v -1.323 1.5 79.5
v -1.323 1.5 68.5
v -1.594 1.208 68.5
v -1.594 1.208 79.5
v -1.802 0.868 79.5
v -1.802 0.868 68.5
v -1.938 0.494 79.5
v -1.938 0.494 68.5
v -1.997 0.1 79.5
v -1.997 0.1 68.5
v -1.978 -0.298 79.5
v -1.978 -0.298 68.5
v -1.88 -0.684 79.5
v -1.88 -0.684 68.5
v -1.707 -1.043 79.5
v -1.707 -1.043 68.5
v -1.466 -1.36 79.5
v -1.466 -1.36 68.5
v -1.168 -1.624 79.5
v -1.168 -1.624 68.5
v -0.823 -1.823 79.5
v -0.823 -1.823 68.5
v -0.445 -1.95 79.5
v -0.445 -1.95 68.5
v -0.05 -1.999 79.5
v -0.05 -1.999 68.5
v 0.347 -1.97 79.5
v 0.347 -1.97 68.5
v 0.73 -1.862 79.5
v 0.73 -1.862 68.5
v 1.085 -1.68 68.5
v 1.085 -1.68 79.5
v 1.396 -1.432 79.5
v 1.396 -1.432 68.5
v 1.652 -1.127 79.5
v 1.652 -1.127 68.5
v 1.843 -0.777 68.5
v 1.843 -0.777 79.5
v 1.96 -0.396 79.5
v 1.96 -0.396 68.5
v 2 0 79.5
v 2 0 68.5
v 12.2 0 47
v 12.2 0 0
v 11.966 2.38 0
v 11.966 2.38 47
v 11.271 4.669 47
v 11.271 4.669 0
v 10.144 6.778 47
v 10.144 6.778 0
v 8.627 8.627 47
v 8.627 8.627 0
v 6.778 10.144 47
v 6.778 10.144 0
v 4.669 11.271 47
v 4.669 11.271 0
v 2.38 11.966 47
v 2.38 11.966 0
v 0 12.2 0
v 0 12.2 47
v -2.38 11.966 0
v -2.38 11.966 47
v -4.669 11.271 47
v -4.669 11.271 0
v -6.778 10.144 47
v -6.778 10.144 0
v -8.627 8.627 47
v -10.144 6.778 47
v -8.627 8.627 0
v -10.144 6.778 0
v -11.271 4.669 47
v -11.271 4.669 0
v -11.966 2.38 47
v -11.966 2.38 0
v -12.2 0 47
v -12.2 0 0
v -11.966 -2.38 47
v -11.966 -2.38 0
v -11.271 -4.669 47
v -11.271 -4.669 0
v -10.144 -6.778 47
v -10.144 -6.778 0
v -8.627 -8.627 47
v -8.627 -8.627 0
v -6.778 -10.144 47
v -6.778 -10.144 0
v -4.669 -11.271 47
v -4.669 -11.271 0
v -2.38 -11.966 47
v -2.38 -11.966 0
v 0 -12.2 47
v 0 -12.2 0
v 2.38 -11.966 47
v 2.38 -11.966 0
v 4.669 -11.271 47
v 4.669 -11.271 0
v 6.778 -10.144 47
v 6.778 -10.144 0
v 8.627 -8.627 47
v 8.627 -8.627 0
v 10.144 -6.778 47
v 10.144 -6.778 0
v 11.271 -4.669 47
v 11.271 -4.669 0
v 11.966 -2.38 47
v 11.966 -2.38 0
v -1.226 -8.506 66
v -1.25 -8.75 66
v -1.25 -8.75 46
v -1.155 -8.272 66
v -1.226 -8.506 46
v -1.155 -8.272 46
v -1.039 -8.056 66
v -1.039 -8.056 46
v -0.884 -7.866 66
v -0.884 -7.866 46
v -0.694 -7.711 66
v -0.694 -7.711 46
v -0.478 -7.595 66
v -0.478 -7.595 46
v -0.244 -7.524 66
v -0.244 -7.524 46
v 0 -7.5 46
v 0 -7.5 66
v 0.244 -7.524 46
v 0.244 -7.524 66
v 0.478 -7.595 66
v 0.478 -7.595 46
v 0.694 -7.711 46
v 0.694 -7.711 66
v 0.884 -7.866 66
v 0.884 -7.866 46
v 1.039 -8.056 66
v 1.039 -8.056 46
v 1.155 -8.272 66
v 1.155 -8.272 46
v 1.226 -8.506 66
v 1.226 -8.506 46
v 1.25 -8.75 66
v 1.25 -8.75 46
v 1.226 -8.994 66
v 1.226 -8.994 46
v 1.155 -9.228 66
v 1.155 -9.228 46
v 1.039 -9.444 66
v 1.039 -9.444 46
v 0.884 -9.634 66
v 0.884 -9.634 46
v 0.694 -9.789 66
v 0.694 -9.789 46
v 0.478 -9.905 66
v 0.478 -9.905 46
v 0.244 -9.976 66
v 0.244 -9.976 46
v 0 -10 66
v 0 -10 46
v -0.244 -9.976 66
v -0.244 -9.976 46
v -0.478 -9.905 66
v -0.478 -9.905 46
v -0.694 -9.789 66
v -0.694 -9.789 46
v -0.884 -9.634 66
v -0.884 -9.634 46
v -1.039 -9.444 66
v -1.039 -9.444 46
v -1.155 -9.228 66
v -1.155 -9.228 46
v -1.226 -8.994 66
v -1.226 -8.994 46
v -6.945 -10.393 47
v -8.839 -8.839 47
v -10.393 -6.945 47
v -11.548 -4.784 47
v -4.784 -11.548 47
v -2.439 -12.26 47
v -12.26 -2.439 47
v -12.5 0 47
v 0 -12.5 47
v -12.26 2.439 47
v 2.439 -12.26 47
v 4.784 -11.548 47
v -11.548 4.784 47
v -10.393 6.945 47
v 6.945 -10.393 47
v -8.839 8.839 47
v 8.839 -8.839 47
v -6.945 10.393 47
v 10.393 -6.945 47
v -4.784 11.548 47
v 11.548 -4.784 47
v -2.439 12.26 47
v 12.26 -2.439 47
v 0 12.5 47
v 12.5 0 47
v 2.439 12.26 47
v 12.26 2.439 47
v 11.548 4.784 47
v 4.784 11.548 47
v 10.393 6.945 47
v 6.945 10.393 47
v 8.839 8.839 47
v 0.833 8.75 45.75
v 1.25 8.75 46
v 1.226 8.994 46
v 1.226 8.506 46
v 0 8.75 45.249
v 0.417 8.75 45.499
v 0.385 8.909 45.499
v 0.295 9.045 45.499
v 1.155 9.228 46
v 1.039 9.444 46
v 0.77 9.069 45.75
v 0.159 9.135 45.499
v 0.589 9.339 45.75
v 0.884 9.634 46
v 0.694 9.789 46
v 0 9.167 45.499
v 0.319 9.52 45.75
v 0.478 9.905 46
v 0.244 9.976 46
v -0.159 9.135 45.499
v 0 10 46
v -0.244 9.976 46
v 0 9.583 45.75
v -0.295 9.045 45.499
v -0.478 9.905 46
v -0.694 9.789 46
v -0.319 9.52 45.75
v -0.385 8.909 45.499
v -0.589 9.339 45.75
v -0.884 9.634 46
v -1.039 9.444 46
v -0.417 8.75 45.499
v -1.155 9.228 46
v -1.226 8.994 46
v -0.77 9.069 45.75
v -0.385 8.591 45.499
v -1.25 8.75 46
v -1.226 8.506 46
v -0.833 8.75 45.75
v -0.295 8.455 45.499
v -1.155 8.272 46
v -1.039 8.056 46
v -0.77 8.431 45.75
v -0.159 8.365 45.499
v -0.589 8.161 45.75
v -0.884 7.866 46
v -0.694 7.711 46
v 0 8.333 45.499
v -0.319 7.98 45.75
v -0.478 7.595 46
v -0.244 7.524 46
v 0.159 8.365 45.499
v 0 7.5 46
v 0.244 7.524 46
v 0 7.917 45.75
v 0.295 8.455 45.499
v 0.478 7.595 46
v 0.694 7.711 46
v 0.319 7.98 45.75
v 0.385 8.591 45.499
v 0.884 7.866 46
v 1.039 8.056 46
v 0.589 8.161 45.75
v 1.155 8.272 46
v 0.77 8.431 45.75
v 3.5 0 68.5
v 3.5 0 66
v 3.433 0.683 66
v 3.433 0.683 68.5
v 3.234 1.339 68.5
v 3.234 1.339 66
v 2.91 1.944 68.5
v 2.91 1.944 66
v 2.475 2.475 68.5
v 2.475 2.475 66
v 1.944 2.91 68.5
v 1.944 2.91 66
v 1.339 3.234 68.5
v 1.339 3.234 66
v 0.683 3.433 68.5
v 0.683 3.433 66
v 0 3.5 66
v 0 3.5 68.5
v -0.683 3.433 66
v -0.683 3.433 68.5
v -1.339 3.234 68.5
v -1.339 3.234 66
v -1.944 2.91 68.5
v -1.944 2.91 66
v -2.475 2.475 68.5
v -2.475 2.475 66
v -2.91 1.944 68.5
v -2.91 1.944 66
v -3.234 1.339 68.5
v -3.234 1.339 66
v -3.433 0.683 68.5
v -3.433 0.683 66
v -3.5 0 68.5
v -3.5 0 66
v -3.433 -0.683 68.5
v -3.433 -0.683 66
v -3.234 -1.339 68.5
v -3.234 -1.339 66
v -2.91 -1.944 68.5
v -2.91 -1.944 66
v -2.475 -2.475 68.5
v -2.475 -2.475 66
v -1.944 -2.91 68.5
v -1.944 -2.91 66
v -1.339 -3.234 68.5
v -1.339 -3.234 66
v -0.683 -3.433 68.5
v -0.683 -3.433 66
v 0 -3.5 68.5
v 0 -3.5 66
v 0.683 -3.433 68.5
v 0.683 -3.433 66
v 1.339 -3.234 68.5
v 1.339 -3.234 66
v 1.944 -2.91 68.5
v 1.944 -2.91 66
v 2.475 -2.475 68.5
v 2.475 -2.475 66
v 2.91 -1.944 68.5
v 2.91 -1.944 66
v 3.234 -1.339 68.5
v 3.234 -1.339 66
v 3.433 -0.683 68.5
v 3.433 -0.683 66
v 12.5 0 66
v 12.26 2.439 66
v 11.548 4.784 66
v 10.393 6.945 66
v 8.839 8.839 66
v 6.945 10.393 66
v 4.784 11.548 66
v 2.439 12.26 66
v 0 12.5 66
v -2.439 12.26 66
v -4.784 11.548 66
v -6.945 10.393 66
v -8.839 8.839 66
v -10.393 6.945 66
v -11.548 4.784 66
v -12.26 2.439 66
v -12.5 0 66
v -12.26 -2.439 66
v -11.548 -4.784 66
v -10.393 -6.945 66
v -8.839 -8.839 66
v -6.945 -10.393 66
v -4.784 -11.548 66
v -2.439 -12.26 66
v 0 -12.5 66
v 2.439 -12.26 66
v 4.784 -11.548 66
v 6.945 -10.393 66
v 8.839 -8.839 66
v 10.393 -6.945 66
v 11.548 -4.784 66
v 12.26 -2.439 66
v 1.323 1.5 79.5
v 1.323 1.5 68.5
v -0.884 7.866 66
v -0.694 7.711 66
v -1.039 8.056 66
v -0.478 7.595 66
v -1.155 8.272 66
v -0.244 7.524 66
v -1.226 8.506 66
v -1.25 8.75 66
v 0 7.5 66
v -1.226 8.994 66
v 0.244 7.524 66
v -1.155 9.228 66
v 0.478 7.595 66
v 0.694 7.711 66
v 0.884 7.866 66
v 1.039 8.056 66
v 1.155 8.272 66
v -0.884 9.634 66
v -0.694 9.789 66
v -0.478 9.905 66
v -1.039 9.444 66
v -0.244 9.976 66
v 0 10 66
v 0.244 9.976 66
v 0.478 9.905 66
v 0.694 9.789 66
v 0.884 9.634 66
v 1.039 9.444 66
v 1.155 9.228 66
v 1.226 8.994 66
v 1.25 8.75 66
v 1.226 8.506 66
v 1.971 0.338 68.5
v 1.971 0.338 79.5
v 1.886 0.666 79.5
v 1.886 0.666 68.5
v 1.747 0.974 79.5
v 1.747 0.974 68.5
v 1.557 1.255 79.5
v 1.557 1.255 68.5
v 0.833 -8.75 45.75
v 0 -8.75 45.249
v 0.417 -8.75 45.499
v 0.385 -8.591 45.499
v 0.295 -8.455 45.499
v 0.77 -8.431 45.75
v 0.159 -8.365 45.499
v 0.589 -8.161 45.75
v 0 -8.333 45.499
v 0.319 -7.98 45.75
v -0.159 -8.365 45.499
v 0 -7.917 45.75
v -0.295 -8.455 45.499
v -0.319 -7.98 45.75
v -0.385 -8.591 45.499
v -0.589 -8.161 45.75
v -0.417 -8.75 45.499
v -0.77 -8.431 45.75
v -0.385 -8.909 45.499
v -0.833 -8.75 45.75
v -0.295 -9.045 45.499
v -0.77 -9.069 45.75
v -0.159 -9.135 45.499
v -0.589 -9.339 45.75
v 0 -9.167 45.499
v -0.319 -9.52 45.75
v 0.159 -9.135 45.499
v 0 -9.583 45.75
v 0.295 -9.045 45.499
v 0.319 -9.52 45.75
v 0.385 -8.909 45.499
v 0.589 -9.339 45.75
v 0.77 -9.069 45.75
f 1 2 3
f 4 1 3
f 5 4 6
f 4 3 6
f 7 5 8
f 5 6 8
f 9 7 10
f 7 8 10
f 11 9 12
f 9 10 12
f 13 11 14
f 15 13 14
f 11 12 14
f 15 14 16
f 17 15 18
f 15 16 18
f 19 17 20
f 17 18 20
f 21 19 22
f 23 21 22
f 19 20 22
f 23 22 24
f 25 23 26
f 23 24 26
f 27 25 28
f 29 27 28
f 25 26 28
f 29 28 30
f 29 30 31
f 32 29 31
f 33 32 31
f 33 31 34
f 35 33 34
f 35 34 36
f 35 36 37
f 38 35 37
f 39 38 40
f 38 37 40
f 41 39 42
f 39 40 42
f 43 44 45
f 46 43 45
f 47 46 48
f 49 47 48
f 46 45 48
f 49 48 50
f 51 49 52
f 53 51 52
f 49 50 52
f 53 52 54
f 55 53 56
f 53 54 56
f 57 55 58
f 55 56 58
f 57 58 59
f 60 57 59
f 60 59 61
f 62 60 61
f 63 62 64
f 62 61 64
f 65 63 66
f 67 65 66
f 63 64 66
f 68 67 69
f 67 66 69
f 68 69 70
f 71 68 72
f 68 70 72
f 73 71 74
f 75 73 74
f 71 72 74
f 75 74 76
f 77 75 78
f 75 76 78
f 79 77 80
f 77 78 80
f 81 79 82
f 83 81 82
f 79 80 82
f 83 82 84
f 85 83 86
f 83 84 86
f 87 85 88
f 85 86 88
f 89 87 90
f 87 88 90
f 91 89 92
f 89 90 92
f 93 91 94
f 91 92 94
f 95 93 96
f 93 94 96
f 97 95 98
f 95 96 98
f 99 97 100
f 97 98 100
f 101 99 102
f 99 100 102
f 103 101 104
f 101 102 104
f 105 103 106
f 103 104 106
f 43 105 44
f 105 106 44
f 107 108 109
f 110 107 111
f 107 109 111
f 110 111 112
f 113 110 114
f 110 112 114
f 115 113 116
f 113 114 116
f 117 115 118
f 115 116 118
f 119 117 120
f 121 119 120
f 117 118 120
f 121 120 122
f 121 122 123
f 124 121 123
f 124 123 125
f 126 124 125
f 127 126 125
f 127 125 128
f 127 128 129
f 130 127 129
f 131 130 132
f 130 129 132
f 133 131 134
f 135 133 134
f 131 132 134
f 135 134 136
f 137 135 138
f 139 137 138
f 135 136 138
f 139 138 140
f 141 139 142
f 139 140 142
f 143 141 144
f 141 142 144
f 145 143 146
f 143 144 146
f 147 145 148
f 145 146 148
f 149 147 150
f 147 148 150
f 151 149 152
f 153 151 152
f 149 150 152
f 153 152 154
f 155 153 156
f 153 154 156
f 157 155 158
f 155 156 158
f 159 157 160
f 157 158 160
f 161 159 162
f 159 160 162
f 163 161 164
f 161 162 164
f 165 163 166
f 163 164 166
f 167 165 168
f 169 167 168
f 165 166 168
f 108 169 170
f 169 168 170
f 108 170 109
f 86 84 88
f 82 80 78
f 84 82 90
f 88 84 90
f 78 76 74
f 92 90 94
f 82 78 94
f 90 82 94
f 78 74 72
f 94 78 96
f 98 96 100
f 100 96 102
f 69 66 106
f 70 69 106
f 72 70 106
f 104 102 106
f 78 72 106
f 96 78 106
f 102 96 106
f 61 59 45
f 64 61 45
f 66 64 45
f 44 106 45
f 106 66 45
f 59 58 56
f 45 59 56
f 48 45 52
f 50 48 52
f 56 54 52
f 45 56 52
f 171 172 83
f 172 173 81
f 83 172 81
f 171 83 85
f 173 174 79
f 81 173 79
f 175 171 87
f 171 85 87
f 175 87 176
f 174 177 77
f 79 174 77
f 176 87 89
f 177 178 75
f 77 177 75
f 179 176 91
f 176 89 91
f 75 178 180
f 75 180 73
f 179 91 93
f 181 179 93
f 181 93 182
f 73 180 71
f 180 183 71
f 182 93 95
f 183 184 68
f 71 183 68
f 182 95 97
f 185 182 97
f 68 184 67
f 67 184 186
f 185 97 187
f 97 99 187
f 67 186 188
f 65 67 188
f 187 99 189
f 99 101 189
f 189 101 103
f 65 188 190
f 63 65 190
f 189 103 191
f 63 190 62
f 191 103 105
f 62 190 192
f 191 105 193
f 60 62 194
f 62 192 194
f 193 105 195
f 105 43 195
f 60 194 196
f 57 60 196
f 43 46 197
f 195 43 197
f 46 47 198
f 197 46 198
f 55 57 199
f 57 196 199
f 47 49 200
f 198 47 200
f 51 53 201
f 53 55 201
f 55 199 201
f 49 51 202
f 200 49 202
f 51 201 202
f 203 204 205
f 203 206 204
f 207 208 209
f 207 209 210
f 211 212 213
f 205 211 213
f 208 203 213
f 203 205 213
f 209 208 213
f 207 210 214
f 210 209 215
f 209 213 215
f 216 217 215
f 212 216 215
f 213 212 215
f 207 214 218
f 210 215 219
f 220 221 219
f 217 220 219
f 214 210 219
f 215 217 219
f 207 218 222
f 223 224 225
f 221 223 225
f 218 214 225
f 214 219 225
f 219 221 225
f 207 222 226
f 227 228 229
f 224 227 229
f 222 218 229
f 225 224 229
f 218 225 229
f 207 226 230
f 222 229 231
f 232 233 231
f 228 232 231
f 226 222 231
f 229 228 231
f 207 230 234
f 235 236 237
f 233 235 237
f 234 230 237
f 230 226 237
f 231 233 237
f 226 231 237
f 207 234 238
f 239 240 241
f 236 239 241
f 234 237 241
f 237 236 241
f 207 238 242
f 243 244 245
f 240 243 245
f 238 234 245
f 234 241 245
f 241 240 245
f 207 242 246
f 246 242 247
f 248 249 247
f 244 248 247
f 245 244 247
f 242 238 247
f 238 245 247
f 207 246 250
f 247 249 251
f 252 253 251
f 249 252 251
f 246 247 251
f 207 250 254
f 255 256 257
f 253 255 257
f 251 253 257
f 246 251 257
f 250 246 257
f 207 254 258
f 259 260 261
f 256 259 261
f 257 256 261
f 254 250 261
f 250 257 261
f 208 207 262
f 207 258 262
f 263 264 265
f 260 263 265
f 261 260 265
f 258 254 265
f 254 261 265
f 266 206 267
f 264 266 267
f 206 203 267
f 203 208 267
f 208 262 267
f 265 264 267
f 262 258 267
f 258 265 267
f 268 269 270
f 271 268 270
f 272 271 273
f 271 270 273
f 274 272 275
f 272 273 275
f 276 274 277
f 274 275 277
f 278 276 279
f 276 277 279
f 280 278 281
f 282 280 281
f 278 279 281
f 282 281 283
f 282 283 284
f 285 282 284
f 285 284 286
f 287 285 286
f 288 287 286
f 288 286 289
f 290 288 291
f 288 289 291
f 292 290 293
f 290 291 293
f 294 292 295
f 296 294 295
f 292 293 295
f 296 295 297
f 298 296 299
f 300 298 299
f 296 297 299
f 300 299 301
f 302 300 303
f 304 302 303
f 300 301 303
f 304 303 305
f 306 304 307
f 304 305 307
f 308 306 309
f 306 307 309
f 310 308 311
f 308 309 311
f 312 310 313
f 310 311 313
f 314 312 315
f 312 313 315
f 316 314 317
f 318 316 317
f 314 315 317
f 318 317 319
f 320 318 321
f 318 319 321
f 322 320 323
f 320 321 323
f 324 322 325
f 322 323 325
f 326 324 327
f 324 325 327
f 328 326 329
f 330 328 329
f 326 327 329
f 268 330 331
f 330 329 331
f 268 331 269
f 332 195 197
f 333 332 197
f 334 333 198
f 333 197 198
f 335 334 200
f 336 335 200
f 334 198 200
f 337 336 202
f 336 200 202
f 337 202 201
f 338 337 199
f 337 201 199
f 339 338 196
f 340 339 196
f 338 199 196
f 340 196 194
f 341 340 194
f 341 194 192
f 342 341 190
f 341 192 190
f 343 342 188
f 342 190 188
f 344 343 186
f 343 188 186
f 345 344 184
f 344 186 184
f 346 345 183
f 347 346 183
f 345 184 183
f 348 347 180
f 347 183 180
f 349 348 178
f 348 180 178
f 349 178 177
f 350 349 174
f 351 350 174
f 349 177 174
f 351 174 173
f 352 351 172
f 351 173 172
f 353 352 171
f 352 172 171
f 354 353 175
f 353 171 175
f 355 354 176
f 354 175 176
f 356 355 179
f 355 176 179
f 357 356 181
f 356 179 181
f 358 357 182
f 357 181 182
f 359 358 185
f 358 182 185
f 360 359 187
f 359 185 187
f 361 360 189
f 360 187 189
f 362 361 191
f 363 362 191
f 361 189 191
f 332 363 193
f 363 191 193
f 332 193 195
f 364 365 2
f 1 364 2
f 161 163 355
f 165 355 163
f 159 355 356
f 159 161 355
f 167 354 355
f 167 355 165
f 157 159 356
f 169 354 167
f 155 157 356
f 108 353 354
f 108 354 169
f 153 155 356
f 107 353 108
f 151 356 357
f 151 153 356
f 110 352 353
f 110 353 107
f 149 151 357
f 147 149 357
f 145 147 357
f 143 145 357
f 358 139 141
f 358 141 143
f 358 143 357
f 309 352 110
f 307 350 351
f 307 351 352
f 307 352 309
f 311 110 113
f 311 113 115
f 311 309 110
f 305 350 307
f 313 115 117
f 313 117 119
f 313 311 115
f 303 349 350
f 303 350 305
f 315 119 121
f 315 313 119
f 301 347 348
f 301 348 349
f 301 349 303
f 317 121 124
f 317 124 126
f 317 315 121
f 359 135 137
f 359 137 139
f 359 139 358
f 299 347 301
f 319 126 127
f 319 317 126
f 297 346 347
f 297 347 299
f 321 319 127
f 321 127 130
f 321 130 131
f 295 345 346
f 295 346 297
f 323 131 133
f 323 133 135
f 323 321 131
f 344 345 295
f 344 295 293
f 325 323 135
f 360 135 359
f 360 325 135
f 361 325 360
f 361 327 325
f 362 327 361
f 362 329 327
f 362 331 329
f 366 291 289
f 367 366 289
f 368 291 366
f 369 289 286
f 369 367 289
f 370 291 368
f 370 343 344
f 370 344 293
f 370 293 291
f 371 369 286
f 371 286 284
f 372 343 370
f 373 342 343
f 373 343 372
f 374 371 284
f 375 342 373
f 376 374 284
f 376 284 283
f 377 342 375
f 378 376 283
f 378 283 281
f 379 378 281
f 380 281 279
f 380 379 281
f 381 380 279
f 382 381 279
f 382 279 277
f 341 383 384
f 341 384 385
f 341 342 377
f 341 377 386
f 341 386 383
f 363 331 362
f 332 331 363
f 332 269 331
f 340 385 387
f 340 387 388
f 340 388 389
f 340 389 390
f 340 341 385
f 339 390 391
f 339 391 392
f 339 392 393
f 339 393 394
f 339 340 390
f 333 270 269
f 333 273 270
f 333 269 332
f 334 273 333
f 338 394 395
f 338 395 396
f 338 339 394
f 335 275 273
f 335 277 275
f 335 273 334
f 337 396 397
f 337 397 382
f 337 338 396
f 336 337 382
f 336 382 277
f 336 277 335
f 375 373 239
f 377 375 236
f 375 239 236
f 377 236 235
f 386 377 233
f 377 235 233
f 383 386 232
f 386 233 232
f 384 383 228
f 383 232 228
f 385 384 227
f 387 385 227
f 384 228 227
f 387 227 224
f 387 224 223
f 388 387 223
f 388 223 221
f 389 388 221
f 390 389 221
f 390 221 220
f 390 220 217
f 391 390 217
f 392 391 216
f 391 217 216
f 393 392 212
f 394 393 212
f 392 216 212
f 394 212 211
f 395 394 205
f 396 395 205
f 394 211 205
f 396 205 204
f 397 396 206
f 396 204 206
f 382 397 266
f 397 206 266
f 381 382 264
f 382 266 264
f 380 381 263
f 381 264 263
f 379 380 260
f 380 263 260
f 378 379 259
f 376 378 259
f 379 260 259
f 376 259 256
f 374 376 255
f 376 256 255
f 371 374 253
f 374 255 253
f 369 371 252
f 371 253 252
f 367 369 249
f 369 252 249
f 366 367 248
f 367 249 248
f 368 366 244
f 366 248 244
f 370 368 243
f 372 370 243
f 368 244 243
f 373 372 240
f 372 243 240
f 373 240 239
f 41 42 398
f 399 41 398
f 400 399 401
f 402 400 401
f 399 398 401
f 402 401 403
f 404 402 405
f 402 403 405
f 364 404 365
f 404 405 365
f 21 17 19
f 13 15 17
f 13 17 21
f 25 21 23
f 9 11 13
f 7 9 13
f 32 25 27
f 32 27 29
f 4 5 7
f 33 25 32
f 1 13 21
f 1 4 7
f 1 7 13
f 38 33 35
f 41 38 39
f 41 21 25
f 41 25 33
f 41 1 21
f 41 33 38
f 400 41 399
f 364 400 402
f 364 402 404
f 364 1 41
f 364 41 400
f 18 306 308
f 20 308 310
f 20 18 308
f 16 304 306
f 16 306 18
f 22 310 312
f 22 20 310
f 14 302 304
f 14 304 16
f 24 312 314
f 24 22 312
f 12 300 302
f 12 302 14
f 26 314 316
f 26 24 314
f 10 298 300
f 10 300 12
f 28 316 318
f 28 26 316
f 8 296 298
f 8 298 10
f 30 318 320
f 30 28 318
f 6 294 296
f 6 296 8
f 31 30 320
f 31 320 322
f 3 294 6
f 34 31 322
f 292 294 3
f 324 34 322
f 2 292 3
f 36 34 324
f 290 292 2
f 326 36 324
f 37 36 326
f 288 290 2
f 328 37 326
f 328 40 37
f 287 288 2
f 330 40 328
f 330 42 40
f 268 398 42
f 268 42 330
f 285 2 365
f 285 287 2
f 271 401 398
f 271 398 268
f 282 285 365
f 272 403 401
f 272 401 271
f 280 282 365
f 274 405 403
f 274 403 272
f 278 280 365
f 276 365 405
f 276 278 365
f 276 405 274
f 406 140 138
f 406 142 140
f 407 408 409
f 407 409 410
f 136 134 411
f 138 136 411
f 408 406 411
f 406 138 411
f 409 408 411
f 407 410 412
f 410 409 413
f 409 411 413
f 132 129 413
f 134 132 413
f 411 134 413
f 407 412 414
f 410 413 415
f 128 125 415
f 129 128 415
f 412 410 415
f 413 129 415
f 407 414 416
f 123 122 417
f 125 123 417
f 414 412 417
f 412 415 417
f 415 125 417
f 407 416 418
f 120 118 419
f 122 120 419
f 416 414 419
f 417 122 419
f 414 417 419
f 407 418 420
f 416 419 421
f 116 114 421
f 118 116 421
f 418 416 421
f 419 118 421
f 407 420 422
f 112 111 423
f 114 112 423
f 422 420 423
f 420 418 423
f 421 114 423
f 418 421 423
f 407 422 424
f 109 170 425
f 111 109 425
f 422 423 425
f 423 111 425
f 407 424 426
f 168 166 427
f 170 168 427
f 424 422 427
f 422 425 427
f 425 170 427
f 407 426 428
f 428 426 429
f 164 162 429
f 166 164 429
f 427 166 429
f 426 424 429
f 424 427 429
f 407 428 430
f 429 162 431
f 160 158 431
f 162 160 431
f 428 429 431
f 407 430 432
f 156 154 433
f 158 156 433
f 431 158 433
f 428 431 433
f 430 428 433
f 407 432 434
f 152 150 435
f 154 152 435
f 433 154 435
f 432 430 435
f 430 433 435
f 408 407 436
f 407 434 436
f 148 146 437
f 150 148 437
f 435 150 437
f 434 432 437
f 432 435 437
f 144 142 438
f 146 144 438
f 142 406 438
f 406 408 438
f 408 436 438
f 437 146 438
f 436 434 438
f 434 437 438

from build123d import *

# Parameters (mm, degrees)
SKETCH1_R                 = 12.2
BOSS_EXTRUDE1_DEPTH       = 47
BOSS_EXTRUDE2_START       = 47
SKETCH1_3_R               = 12.5
SKETCH1_3_R_2             = 12.2
BOSS_EXTRUDE2_DEPTH       = 19
SKETCH2_R                 = 3.5
SKETCH2_R_2               = 2
BOSS_EXTRUDE4_DEPTH       = 2.5
BOSS_EXTRUDE5_START       = 2.5
BOSS_EXTRUDE5_DEPTH       = 11
M3X0_5_TAPPED_HOLE1_D     = 2.5
M3X0_5_TAPPED_HOLE1_DEPTH = 20
M3X0_5_TAPPED_HOLE1_TIP   = 0.751075774


with BuildPart() as part:
    # Sketch1 → Boss-Extrude1 (new body)
    with BuildSketch(Plane.XY):
        Circle(SKETCH1_R)
    extrude(amount=BOSS_EXTRUDE1_DEPTH)

    # Sketch1<3> → Boss-Extrude2 (add)
    with BuildSketch(Plane.XY.offset(BOSS_EXTRUDE2_START)):
        Circle(SKETCH1_3_R)
        Circle(SKETCH1_3_R_2, mode=Mode.SUBTRACT)
        Circle(SKETCH1_3_R_2)
    extrude(amount=BOSS_EXTRUDE2_DEPTH)

    # Sketch2 → Boss-Extrude4 (add)
    with BuildSketch(Plane.XY.offset(66)):
        Circle(SKETCH2_R)
        Circle(SKETCH2_R_2, mode=Mode.SUBTRACT)
        with BuildLine():
            Line((1.322875656, 1.5), (-1.322875656, 1.5))
            ThreePointArc((-1.322875656, 1.5), (-0.822875656, -1.822875656), (2, 0))
            ThreePointArc((2, 0), (1.822875656, 0.822875656), (1.322875656, 1.5))
        make_face()
        with BuildLine():
            ThreePointArc((1.322875656, 1.5), (0, 2), (-1.322875656, 1.5))
            Line((-1.322875656, 1.5), (1.322875656, 1.5))
        make_face()
    extrude(amount=BOSS_EXTRUDE4_DEPTH)

    # Sketch2<4> → Boss-Extrude5 (add)
    with BuildSketch(Plane.XY.offset(66).offset(BOSS_EXTRUDE5_START)):
        with BuildLine():
            Line((1.322875656, 1.5), (-1.322875656, 1.5))
            ThreePointArc((-1.322875656, 1.5), (-0.822875656, -1.822875656), (2, 0))
            ThreePointArc((2, 0), (1.822875656, 0.822875656), (1.322875656, 1.5))
        make_face()
    extrude(amount=BOSS_EXTRUDE5_DEPTH)

    # M3x0.5 Tapped Hole1
    with Locations(Plane(origin=(0, 8.75, 66), x_dir=(1, 0, 0), z_dir=(0, 0, 1))):
        with Locations((0, 0), (0, -17.5)):
            Hole(M3X0_5_TAPPED_HOLE1_D / 2, depth=M3X0_5_TAPPED_HOLE1_DEPTH)
            with Locations((0, 0, -(M3X0_5_TAPPED_HOLE1_DEPTH + M3X0_5_TAPPED_HOLE1_TIP / 2))):  # 118° drill point
                Cone(0, M3X0_5_TAPPED_HOLE1_D / 2, M3X0_5_TAPPED_HOLE1_TIP, mode=Mode.SUBTRACT)


solid = part.part
